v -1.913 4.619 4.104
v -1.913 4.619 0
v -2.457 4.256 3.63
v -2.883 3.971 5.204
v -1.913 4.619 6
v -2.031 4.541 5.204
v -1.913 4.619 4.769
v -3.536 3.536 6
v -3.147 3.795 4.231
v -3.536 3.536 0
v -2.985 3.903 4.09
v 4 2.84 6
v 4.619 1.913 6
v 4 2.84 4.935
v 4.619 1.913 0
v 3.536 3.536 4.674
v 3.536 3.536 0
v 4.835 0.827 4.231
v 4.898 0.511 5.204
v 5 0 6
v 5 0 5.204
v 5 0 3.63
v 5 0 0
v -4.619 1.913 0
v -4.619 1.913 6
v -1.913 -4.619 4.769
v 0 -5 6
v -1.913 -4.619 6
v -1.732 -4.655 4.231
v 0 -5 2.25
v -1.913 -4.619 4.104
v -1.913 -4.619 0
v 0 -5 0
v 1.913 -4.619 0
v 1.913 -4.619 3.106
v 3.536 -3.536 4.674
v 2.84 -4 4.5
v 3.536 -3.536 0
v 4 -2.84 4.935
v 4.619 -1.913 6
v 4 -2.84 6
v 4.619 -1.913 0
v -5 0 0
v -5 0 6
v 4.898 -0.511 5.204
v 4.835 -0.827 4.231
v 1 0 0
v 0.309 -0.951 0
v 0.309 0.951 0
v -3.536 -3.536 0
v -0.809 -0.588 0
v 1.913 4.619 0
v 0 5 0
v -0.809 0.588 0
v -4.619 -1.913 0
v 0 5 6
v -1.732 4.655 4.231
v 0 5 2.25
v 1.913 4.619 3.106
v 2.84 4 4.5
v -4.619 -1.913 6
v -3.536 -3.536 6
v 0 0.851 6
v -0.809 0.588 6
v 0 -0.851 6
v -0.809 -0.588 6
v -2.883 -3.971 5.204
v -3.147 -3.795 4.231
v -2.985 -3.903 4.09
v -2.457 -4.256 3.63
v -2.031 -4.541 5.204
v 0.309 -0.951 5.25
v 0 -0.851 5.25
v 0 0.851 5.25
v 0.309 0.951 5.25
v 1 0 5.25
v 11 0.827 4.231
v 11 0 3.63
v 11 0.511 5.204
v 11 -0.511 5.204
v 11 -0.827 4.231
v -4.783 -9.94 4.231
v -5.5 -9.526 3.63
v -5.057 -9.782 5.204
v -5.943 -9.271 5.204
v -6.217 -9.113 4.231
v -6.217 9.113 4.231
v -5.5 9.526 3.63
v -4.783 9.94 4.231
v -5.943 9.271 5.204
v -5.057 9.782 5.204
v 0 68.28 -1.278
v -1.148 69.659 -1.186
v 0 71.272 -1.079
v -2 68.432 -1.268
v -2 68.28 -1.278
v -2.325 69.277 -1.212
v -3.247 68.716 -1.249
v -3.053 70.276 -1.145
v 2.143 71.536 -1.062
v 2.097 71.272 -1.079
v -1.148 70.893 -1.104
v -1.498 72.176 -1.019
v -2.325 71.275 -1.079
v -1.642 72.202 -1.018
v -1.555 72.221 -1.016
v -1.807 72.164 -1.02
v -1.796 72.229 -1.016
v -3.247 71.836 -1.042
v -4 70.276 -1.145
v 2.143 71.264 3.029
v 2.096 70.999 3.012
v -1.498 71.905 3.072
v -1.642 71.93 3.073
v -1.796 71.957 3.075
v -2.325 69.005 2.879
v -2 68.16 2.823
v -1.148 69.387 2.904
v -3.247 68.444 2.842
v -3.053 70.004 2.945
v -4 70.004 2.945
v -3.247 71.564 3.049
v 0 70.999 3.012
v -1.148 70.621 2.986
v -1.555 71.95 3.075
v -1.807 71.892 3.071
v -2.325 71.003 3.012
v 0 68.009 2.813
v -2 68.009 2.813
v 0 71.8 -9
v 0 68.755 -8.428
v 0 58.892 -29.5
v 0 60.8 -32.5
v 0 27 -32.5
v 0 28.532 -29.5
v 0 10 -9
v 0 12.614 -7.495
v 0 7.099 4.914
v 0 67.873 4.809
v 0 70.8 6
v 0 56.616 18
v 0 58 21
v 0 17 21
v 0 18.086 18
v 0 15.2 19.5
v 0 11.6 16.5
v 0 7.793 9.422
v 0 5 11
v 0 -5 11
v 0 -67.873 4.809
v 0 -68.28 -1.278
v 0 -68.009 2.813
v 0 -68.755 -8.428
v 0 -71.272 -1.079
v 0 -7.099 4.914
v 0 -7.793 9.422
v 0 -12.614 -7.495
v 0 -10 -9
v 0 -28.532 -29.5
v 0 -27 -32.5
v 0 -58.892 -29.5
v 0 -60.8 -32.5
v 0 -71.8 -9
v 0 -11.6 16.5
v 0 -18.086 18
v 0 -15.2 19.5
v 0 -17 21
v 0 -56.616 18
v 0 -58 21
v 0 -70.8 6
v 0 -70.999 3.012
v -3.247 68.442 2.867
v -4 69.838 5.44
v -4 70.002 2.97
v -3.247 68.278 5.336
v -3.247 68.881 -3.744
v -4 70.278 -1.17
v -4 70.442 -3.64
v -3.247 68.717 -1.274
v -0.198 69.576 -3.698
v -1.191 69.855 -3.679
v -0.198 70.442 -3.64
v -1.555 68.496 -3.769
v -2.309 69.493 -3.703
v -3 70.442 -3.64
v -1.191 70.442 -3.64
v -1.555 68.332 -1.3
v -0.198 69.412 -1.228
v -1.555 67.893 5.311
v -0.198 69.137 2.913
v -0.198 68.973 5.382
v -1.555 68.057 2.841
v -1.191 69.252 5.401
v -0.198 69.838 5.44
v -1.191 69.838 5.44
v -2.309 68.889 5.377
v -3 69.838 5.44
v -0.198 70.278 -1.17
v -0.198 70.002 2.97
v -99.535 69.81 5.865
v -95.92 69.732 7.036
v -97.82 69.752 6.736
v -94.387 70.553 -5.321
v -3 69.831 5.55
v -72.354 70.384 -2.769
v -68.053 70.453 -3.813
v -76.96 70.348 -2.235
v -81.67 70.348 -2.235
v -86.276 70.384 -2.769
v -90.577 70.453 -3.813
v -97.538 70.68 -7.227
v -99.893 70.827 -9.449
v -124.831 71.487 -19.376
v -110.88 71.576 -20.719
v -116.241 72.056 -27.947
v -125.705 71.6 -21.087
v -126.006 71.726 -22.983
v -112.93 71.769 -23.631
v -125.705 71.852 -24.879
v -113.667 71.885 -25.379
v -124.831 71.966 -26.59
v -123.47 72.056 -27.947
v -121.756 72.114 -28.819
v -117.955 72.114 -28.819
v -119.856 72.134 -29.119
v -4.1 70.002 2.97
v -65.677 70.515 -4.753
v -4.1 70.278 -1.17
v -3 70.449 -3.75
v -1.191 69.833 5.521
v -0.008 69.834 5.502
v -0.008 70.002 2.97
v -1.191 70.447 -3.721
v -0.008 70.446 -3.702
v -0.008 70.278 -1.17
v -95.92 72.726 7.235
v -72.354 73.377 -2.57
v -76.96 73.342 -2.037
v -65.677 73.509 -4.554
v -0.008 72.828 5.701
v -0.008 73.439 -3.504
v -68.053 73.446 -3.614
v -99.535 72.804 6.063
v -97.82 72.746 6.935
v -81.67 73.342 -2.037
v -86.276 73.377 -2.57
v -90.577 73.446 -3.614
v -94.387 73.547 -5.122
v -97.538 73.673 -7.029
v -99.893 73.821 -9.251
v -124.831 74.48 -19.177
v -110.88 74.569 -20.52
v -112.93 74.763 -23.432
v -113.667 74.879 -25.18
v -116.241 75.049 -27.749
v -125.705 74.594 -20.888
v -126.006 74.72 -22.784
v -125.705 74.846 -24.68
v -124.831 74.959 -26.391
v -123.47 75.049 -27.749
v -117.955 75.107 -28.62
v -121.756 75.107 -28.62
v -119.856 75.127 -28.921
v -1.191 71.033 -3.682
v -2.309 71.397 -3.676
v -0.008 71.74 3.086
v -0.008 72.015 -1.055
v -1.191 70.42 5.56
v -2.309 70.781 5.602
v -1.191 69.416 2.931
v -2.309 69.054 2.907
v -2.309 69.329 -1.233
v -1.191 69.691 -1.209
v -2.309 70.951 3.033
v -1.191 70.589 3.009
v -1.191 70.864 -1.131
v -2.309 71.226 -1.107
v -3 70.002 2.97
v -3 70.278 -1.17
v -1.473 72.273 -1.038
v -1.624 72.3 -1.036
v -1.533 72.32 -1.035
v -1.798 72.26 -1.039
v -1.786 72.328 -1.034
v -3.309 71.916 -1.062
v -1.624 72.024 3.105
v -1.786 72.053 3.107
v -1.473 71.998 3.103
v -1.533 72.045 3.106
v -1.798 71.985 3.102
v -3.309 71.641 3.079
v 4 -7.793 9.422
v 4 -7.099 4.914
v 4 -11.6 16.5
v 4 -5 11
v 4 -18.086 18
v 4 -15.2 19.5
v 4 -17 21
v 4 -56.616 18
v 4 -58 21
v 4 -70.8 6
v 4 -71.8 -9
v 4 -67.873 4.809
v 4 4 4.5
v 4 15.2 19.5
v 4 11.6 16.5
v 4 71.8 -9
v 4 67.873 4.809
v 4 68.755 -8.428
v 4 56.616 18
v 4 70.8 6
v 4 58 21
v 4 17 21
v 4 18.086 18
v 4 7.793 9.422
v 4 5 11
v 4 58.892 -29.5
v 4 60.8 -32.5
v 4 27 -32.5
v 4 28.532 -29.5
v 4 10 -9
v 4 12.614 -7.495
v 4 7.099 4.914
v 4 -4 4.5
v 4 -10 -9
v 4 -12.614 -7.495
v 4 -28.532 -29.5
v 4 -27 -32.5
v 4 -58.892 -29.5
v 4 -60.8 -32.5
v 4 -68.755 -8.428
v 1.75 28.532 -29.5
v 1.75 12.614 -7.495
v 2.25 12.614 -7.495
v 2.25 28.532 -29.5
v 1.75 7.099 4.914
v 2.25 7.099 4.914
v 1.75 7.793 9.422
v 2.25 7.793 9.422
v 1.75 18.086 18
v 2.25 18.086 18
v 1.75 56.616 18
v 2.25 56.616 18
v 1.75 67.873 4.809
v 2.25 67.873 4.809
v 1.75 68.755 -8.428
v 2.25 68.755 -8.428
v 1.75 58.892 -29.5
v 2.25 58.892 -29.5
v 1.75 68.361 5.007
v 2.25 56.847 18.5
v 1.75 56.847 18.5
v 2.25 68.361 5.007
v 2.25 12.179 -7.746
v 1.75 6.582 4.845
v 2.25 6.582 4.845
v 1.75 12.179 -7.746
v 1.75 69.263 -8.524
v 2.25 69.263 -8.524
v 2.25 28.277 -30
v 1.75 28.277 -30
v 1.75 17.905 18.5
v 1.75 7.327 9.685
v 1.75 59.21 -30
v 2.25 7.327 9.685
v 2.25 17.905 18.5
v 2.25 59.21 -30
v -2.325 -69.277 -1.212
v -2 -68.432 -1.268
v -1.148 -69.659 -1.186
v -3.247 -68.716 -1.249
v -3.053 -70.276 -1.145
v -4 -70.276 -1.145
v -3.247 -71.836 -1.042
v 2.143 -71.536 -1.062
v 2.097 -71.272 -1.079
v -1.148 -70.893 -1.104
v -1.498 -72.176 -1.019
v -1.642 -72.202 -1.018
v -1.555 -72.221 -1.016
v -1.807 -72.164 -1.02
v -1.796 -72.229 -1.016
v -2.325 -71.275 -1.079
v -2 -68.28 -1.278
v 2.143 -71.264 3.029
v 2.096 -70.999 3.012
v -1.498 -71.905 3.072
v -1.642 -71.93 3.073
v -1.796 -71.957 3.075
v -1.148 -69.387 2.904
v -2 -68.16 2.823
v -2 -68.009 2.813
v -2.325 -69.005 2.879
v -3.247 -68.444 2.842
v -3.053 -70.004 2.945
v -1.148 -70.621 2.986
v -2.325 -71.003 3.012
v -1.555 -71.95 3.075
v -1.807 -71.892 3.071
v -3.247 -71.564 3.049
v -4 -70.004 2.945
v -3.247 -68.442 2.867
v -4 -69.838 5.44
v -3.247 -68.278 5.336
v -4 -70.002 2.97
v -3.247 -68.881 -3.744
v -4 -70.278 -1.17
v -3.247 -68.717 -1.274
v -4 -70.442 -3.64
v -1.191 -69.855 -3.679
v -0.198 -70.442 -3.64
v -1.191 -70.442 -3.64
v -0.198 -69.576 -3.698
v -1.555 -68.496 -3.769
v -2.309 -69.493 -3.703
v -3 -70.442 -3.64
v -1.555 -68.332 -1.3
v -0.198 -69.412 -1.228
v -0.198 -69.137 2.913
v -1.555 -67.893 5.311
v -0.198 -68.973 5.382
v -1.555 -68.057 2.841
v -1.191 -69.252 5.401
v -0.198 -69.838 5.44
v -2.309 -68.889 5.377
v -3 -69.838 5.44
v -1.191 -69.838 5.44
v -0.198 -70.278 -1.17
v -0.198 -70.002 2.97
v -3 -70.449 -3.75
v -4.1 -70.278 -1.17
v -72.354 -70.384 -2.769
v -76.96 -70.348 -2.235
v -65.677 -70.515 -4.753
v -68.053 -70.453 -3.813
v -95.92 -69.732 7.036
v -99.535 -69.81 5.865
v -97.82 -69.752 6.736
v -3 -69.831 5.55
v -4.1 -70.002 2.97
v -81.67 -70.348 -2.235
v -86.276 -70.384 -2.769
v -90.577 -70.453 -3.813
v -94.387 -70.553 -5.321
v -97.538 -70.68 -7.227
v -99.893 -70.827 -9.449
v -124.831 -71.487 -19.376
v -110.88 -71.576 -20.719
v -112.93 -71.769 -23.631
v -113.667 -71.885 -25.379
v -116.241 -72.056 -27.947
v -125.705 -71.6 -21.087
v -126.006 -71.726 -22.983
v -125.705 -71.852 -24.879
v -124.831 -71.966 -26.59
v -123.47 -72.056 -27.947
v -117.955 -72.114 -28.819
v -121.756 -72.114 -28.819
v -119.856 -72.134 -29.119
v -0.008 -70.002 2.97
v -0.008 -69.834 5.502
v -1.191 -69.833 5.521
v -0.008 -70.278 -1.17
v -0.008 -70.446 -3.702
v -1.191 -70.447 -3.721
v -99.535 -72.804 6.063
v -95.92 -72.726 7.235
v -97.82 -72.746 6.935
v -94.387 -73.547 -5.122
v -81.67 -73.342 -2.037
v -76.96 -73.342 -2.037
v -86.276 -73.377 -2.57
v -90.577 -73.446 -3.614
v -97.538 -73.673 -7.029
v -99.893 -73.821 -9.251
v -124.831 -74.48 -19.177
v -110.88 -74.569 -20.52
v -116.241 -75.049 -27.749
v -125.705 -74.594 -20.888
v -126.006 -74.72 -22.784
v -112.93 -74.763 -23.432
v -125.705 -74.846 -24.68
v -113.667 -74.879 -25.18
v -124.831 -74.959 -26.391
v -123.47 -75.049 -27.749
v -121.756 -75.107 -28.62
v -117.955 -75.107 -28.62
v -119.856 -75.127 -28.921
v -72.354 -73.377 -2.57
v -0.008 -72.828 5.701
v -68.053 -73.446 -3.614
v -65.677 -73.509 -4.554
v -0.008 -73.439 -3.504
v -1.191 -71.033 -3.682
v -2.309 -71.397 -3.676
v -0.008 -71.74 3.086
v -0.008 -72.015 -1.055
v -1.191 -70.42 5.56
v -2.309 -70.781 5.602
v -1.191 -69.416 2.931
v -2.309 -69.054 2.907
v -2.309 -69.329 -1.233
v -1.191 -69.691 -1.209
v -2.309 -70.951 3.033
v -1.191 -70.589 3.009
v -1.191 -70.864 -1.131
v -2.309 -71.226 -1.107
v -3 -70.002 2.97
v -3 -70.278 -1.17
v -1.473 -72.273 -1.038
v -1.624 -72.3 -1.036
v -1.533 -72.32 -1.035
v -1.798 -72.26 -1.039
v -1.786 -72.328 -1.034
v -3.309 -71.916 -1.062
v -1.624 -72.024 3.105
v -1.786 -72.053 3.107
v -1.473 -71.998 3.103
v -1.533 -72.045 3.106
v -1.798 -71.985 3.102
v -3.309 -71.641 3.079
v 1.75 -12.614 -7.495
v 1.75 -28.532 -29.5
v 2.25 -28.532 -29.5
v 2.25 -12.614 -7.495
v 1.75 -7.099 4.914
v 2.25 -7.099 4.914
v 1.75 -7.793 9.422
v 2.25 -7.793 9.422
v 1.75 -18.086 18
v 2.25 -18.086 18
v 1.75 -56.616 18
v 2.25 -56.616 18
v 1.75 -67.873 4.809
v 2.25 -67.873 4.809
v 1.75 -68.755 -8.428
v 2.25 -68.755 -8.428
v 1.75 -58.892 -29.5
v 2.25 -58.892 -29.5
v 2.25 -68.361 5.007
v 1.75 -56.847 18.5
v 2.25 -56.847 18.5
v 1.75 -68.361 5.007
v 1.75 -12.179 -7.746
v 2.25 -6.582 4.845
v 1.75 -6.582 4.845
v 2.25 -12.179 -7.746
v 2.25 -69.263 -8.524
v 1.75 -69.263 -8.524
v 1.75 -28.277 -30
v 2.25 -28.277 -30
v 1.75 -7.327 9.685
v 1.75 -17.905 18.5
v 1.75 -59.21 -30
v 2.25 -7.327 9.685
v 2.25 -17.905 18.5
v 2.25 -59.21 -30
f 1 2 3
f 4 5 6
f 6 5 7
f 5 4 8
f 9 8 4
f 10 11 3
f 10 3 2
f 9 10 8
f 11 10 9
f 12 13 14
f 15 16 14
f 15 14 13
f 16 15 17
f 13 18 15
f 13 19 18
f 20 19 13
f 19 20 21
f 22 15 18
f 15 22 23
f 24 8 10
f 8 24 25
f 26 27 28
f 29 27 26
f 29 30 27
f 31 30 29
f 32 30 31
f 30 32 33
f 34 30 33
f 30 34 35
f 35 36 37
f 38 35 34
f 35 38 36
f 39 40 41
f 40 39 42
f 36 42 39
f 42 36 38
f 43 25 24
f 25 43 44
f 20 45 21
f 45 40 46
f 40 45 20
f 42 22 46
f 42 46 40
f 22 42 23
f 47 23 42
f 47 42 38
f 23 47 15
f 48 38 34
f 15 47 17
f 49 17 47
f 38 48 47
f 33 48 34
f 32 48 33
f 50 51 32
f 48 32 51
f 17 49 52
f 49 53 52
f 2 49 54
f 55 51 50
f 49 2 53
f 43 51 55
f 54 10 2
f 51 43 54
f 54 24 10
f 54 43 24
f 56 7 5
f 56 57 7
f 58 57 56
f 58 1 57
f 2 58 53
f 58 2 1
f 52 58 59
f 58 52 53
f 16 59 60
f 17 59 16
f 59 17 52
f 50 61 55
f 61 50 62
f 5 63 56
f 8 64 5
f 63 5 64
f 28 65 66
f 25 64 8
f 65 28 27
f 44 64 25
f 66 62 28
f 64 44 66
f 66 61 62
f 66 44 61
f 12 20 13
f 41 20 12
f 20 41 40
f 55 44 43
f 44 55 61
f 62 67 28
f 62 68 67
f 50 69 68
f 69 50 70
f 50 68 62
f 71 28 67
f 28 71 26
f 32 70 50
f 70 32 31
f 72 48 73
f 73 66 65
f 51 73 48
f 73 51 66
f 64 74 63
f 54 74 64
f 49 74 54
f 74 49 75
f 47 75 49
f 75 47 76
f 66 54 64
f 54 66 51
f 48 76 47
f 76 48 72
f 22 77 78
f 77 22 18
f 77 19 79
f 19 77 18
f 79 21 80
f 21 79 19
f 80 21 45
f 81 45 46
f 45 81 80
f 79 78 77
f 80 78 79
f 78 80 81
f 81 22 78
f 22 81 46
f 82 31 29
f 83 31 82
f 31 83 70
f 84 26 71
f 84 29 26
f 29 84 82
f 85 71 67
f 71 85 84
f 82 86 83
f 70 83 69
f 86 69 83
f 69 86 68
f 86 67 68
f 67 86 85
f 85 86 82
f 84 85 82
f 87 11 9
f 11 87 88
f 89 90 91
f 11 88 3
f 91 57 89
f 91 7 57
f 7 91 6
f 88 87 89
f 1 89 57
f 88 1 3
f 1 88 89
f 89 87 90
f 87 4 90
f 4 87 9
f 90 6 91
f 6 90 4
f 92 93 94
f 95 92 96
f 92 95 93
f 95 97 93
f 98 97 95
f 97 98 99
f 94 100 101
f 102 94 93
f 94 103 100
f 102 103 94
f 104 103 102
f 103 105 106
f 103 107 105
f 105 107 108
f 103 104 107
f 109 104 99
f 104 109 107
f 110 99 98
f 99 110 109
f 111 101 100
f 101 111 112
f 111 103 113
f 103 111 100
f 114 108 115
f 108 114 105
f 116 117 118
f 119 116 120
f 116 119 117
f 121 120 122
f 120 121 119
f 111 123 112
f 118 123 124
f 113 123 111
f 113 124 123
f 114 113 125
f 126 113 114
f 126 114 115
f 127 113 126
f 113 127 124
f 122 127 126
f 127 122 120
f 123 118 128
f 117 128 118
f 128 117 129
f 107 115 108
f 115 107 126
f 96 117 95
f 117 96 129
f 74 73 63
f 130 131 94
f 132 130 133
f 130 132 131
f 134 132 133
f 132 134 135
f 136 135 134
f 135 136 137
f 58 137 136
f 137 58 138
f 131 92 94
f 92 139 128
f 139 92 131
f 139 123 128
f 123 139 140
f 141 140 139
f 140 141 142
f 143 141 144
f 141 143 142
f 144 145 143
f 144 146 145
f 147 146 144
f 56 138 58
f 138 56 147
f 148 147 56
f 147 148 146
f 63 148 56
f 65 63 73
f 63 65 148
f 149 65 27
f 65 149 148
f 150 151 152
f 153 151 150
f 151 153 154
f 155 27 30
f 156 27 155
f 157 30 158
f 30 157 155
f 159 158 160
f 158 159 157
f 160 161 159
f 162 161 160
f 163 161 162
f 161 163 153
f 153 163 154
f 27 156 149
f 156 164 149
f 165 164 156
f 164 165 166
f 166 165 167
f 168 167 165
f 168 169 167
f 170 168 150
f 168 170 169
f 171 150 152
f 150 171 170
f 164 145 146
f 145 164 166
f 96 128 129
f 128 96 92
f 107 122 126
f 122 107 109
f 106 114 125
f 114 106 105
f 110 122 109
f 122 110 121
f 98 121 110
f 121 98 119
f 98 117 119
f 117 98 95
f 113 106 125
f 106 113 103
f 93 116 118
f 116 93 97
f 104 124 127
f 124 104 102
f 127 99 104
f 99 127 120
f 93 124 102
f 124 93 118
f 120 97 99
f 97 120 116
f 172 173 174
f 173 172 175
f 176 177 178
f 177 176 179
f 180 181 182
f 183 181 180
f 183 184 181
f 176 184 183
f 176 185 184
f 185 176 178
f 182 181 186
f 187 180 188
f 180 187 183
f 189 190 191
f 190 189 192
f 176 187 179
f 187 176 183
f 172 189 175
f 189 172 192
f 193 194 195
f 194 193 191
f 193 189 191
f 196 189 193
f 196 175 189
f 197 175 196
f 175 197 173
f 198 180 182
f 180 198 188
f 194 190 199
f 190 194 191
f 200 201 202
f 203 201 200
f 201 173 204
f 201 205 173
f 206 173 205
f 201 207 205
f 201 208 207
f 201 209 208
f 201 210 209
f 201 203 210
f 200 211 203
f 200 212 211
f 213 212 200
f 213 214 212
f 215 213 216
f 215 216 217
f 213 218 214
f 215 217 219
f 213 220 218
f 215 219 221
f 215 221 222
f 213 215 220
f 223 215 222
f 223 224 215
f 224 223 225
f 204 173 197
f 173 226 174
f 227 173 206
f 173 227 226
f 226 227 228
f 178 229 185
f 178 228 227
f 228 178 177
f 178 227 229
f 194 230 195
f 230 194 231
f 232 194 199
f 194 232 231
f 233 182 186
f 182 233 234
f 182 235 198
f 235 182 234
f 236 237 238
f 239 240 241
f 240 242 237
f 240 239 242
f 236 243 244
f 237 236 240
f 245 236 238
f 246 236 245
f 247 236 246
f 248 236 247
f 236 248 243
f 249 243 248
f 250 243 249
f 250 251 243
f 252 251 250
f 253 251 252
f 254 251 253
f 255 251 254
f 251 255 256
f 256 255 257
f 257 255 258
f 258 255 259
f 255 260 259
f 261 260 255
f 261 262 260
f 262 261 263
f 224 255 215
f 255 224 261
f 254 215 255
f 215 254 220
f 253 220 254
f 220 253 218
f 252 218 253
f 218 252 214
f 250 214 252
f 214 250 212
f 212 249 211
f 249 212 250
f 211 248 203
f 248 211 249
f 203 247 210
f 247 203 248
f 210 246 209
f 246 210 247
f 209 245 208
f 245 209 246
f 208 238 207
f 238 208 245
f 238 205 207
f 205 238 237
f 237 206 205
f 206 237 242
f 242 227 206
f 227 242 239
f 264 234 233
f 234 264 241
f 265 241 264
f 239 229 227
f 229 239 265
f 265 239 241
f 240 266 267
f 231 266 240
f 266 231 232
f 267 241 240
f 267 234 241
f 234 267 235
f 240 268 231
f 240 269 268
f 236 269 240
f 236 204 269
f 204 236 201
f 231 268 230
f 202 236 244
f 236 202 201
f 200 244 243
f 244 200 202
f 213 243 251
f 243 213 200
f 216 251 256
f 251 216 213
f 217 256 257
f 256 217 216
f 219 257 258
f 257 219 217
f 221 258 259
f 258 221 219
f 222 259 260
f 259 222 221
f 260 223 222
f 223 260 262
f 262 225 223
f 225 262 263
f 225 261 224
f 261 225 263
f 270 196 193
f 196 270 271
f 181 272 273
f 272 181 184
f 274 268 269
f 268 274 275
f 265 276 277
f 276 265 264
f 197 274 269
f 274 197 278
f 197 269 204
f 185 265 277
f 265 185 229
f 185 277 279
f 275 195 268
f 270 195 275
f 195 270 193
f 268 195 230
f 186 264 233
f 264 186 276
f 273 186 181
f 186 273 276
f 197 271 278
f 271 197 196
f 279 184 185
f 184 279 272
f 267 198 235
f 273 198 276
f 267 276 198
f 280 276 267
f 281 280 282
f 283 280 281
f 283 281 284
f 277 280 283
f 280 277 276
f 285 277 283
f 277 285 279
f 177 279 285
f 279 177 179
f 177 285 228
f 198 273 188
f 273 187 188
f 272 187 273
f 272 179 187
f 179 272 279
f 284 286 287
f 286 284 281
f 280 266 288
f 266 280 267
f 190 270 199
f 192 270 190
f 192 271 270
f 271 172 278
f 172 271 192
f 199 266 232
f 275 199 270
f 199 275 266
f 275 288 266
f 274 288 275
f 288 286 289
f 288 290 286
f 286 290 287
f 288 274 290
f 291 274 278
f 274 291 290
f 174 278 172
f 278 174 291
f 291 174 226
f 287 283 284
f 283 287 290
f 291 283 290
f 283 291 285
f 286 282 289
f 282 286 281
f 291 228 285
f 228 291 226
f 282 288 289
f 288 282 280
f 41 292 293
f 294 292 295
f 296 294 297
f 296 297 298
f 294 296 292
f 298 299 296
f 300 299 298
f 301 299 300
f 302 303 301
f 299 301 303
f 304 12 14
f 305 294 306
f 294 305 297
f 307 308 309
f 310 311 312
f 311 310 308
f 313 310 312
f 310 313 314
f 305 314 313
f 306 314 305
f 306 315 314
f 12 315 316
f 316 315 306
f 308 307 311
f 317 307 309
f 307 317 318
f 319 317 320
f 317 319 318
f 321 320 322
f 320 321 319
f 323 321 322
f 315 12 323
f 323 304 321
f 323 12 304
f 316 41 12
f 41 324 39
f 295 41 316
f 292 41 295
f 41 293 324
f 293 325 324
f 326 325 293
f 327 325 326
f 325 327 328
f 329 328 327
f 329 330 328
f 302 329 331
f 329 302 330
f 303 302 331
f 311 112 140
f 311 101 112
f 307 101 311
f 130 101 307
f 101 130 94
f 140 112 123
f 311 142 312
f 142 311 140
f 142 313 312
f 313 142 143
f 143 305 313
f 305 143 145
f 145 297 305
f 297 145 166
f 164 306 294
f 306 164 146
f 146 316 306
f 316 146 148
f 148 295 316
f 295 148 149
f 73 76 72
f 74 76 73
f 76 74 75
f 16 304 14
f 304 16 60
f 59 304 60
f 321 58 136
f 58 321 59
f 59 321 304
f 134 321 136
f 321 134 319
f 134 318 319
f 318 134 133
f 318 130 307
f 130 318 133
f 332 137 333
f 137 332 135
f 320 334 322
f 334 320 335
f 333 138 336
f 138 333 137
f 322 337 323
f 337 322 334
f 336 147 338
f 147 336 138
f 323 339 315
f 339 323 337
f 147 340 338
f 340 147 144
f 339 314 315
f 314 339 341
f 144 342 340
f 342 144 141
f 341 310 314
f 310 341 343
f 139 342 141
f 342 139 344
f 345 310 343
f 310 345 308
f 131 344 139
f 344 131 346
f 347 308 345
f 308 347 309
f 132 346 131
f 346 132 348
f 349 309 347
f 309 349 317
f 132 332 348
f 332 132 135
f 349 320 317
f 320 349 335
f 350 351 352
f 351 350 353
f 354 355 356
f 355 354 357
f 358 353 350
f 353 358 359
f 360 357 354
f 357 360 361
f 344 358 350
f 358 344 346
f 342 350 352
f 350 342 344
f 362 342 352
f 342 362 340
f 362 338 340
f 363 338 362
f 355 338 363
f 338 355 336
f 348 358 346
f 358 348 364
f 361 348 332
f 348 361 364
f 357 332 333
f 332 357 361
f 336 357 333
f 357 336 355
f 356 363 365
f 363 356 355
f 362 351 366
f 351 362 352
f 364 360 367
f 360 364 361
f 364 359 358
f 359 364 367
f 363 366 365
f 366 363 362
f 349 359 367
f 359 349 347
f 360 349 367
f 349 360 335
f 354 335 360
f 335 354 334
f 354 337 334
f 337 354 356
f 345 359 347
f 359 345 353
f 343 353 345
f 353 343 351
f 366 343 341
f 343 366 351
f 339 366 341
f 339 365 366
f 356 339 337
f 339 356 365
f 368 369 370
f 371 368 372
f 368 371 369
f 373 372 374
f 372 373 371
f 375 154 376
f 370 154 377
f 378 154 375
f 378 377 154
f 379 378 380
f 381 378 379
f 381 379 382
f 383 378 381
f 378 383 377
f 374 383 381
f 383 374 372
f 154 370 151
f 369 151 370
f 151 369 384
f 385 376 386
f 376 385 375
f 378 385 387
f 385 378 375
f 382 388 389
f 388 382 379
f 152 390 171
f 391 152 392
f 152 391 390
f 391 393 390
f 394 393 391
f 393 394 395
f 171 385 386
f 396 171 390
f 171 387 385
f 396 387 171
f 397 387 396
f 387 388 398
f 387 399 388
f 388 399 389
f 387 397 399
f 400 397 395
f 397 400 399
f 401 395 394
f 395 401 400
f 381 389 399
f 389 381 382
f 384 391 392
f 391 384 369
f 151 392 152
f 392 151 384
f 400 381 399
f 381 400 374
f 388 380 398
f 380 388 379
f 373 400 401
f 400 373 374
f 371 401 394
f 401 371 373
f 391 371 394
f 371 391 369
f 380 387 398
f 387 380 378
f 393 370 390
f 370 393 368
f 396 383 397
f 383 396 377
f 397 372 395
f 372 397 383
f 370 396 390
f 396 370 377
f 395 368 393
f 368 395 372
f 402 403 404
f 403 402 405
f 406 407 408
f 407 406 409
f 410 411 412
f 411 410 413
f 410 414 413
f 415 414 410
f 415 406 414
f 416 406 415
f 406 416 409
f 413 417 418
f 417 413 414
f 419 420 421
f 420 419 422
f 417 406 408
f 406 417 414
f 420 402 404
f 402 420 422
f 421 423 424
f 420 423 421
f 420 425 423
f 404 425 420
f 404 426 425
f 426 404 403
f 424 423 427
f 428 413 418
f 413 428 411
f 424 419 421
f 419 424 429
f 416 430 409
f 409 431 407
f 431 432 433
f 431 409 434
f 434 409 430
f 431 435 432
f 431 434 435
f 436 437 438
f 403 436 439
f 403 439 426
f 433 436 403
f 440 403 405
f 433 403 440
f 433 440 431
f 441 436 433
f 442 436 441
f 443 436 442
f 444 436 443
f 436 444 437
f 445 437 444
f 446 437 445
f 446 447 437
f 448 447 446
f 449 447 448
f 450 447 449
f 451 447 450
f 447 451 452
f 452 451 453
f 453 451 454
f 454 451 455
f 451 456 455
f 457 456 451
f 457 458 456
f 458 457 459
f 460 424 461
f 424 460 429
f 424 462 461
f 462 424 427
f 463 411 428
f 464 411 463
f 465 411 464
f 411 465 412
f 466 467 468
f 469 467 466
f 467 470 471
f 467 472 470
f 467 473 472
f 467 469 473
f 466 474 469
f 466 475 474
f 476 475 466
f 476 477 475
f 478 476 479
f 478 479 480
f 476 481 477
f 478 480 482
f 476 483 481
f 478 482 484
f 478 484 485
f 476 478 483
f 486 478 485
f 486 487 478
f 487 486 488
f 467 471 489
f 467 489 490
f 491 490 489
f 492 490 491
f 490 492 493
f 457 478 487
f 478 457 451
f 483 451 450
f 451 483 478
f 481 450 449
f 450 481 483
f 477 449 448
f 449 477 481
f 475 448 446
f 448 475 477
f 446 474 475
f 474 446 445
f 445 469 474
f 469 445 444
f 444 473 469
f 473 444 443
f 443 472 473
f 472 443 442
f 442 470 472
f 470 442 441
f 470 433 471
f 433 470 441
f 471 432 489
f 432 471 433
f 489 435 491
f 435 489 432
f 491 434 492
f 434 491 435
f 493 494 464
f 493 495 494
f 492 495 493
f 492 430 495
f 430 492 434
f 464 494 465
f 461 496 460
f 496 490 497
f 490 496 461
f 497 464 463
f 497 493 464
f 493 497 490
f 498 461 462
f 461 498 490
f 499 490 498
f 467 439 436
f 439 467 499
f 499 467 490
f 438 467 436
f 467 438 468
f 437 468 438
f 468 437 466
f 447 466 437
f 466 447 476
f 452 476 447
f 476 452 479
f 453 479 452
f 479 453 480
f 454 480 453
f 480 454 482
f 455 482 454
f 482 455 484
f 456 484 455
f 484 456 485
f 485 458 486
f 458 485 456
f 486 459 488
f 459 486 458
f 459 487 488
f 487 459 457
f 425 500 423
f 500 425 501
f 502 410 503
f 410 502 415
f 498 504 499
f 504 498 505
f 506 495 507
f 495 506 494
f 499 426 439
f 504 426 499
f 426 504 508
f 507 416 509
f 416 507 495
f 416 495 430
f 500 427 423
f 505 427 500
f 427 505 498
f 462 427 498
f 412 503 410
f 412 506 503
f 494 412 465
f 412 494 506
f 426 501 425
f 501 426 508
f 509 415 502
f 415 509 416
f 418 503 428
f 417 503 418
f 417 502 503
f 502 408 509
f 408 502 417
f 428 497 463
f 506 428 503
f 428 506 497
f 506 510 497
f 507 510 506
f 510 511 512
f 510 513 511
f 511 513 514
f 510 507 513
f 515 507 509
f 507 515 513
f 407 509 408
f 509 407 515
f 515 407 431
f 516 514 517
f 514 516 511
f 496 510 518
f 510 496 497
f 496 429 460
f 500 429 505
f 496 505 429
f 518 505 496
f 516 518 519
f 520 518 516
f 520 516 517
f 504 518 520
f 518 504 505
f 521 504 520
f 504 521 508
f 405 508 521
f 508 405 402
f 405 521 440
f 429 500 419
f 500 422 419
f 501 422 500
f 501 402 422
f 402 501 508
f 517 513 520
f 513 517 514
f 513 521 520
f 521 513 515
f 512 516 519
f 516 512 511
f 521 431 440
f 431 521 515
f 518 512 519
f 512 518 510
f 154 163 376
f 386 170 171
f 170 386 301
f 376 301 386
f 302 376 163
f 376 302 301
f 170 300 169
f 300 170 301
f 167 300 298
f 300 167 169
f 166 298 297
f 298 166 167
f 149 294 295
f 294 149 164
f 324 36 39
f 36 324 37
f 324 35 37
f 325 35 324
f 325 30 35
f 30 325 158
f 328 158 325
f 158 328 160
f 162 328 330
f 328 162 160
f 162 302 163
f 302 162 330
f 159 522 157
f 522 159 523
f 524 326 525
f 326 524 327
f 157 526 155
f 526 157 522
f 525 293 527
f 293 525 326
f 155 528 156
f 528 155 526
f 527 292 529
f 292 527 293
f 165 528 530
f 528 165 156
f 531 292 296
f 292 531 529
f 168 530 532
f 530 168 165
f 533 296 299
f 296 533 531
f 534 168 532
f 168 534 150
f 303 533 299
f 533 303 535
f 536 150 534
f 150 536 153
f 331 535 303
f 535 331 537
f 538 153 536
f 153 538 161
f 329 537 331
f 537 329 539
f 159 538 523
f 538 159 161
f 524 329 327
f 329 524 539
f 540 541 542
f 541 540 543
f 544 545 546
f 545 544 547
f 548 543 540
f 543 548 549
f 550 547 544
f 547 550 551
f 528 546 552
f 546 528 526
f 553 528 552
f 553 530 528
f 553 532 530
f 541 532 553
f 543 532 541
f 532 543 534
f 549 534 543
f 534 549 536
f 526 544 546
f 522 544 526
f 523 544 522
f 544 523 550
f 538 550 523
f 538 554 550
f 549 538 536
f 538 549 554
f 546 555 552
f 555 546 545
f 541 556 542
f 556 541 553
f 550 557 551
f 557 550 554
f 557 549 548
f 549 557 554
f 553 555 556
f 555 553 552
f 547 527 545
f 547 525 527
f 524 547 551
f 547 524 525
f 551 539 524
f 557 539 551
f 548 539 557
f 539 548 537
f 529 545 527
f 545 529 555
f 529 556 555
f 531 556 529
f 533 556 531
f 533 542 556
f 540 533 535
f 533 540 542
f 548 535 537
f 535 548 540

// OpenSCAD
// file: config/NopSCADlib/lib.scad
module halfCylinder(r,h) {
  e=.02;
  difference(){
    cylinder(h,r,r);
    translate ([0,-(r+e),-e])
      cube([2*(r+e),2*(r+e),h+2*e]);
  };    
};

module winner(text,x,y,z,fontSize,extrusionHeight) {
  translate([x,y,z])
    linear_extrude(height=extrusionHeight)
      text(text,size=fontSize,halign="left");
};
// file: config/NopSCADlib/utils/core/core.scad
use <threads.scad>

module core() {
    rod_r = 1.74/2;
    rod_l = 8;
    difference() {
        cylinder(h=6, r=10/2);
        translate([0,0,-0.5]) cylinder(h=7,r=2/2);
        //translate([0,0,-0.5]) metric_thread(2, 0.4, 7, internal=true);
    }
    translate([0,0,4.5]) {
        rotate([0,90,0]) translate([0,0,6/2]) cylinder(h=rod_l, r=rod_r);
        rotate([120,90,0]) translate([0,0,6/2]) cylinder(h=rod_l, r=rod_r);
        rotate([240,90,0]) translate([0,0,6/2]) cylinder(h=rod_l, r=rod_r);
    }
}

core();
// file: frameConnector.scad
include <config/3d_printer.scad>;
use <donut.scad>;

module frameConnectorCubes(
  radius,
  width = 2.15,
) {
  translate([-radius, radius/3.2, 0])
  rotate([0, 0, 10])
    cube([radius*2, radius, width], center=true);
  translate([-radius/2, -radius/2, 0])
    cube([radius,radius, width], center=true);
}
module frameConnectorBase(
  radius,
  width = 2.15,
) {
  donut(radius=radius, width=width, innerRadius=radius/1.9)
  frameConnectorCubes(radius, width);
}

module frameConnector(
  radius,
  width=4.1,
) {
  // TODO: should i subtract a middle donut from a longer donut instead of two smalls?
  frameConnectorBase(radius, width);
}
/* if (false) */
frameConnector(radius=2);
// file: earpiece.scad
include <config/3d_printer.scad>;

module earCutout(
  earCutoutRadius,
  earAngle,
) {
  ringus = 3.5;
  translate([earCutoutRadius * 1.35, -earCutoutRadius * 1.25, 0])
  resize([earCutoutRadius * ringus + 2, 0, 0], auto=[true,false,false])
  circle(r=earCutoutRadius);

  translate([earCutoutRadius * .15, -earCutoutRadius * 2, 0])
  rotate([0, 0, earAngle])
  resize([earCutoutRadius * ringus, 0, 0], auto=[true,false,false])
  circle(r=earCutoutRadius);
}

module earpiece(
  tipRadius=2,
  bodyLength=24,
  earLength=10,
  earAngle=45,
  cutoutAngle=45/2
) {
  difference() {
    union() {
      hull() {
        circle(r=tipRadius);
        translate([-earLength * cos(earAngle), -earLength * sin(earAngle), 0])
        circle(r=tipRadius);
      }
      hull() {
        circle(r=tipRadius);
        translate([bodyLength,0, 0])
        square(size=tipRadius*1.5, center=true);
      }
    }
    hull()
      earCutout(earCutoutRadius=tipRadius * 2, earAngle=cutoutAngle);
  }

}

earAngel=45;
tipRadius=6.15;
color("whitesmoke")
translate([0, 0, -1])
linear_extrude(3)
  earpiece(
    tipRadius=6.15,
    bodyLength=91.3,
    earLength=40 - 6.15
  );
translate([0, 0, -2])
color("blue")
linear_extrude(0)
  earCutout(tipRadius * 2, earAngel/2);
// file: donut.scad
module donut(
  width,
  radius,
  innerRadius
) {
  _innerRadius = innerRadius == undef ? radius / 2 : innerRadius;
  difference() {
    union() {
      cylinder(r=radius, h=width, center=true);
      children();
    }
    cylinder(r=_innerRadius, h=width + 1000, center=true);
  }
}
// file: mirror_copy.scad
// A custom mirror module that retains the original
// object in addition to the mirrored one.
module mirror_copy(v = [1, 0, 0]) {
    children();
    mirror(v) children();
}
// file: config/3d_printer.scad
/*
 * @name Replimat 3D Printer
 * @author Timothy Schmidt
 * @date 2021
 * @url http://www.github.com/timschmidt/replimat
 * @license http://www.gnu.org/licenses/agpl-3.0.en.html
 * @license https://www.tapr.org/TAPR_Open_Hardware_License_v1.0.txt
 */

//
//! A 3D printer
//
include <NopSCADlib/utils/core/core.scad>
include <NopSCADlib/lib.scad>
// main file
include <config/3d_printer.scad>;
use <mirror_copy.scad>;
use <donut.scad>;
use <earpiece.scad>;
use <frameConnector.scad>;

module reference() {
  color("blue") {
    import("/Users/asks/Documents/OpenSCAD/sunglasses/DG_Frame_1_v2_v_rebuilt.stl");
  }
}



module earpieceConnector(
  earpieceConnectorThickness=4.1,
  radius,
  bodyLength=91.3,
  bodyThickness=3,
) {
  difference() {
    donut(
      radius=radius,
      width=earpieceConnectorThickness + 5
    ) {
      zcenter = -earpieceConnectorThickness / 2;
      translate([bodyLength + radius * 1.31, 0, 0])
      rotate([-90,0,0])
      mirror([1,0,0])
      linear_extrude(bodyThickness)
        earpiece(
          tipRadius=6.15,
          bodyLength=bodyLength,
          earLength=40 - 6.15
        );
    }
    cylinder(r=radius + 0.1, h=earpieceConnectorThickness + 0.05, center=true);
    frameConnectorCubes(radius + 0.1, earpieceConnectorThickness + 0.05);
  }
}

module funky_stuff(
  // major dimenions
  // TODO: how does this relate to connectors
  length = 143.6,
  height = 53.5,
  frameThickness = 3,
  lensThickness = .5,
  //minor dimensions
  frameTop = 20,
  noseTop = 10,
  noseBottom = 4.25,
  frameTopRight = 58,
  connectorRight = 68,
  frameLeftX = 4,
  frameLeftY = 3.5,
  frameBottomLeftX = 27,
  frameRightX = 64,
  frameRightY = 5,
  zThickness = 4,
  showEarpiece = true,
) {
  frameBottom = frameTop - height;
  frameRightX = length / 2 - 1; // TODO: remove -1 from this number?

  topMiddle = [0, noseTop];

  r1 = [frameLeftX + 1, noseTop];
  /* TODO: name ur[0] */
  ur = [17, frameTop];
  r2 = [frameTopRight, frameTop];
  ld1 = [frameRightX, frameRightY];
  ld2 = [frameRightX + 1, -10];
  ld3 = [frameRightX - 10, frameBottom];
  l1 = [frameBottomLeftX, frameBottom];
  ul1 = [10, -10];
  ul2 = [frameLeftX, frameLeftY];

  ul3 = [2, noseBottom];
  l2 = [0, noseBottom];

  nosePoints = [topMiddle,r1,ul2,ul3,l2];

  framePoints = [
    r1,
    ur,
    r2,
    ld1,
    ld2,
    ld3,
    l1,
    ul1,
    ul2,
  ];

  bridgeTop = frameTop - 1.5;
  bridgeBottom = bridgeTop - frameThickness;
  bridgePoints = [
    [0, bridgeTop],
    [ur[0], bridgeTop],
    [ur[0], bridgeBottom],
    [0, bridgeBottom]
  ];

  mirror_copy() {
    connectorDonutRadius = frameThickness * 2 / 3;
    // TODO: derive translate and rotate from length and close points
    translate([70.14, -.1, -connectorDonutRadius])
    rotate([86.2, 90, 0]) {
      color("green")
      frameConnector(radius=connectorDonutRadius);
      if (showEarpiece)
        color("green", 1)
        earpieceConnector(radius=connectorDonutRadius);
    }

    color("yellow", 1)
    difference() {
      // lens
      linear_extrude(height = zThickness) {
        difference() {
          union() {
            polygon(points=bridgePoints);
            polygon(points=nosePoints);
            polygon(points=framePoints);
          }
          offset(r= -frameThickness)
            polygon(points=framePoints);
        }
      }
      // lens inset
      translate([0, 0, (zThickness - lensThickness)/2])
      linear_extrude(height = lensThickness)
      offset(r = -frameThickness + .5)
        polygon(points=framePoints);
    }



  }
}

/* reference(); */
frameThickness = 3;


if (false)
mirror_copy([0,0,1])
translate([0,0,10])
earpieceConnector(radius=frameThickness * 2 / 3);

/* if (false) */
translate([0,0,1])
rotate([90,0,90]) {
  funky_stuff(
    frameThickness=frameThickness,
    zThickness = 4,
    showEarpiece=true
  );
}
